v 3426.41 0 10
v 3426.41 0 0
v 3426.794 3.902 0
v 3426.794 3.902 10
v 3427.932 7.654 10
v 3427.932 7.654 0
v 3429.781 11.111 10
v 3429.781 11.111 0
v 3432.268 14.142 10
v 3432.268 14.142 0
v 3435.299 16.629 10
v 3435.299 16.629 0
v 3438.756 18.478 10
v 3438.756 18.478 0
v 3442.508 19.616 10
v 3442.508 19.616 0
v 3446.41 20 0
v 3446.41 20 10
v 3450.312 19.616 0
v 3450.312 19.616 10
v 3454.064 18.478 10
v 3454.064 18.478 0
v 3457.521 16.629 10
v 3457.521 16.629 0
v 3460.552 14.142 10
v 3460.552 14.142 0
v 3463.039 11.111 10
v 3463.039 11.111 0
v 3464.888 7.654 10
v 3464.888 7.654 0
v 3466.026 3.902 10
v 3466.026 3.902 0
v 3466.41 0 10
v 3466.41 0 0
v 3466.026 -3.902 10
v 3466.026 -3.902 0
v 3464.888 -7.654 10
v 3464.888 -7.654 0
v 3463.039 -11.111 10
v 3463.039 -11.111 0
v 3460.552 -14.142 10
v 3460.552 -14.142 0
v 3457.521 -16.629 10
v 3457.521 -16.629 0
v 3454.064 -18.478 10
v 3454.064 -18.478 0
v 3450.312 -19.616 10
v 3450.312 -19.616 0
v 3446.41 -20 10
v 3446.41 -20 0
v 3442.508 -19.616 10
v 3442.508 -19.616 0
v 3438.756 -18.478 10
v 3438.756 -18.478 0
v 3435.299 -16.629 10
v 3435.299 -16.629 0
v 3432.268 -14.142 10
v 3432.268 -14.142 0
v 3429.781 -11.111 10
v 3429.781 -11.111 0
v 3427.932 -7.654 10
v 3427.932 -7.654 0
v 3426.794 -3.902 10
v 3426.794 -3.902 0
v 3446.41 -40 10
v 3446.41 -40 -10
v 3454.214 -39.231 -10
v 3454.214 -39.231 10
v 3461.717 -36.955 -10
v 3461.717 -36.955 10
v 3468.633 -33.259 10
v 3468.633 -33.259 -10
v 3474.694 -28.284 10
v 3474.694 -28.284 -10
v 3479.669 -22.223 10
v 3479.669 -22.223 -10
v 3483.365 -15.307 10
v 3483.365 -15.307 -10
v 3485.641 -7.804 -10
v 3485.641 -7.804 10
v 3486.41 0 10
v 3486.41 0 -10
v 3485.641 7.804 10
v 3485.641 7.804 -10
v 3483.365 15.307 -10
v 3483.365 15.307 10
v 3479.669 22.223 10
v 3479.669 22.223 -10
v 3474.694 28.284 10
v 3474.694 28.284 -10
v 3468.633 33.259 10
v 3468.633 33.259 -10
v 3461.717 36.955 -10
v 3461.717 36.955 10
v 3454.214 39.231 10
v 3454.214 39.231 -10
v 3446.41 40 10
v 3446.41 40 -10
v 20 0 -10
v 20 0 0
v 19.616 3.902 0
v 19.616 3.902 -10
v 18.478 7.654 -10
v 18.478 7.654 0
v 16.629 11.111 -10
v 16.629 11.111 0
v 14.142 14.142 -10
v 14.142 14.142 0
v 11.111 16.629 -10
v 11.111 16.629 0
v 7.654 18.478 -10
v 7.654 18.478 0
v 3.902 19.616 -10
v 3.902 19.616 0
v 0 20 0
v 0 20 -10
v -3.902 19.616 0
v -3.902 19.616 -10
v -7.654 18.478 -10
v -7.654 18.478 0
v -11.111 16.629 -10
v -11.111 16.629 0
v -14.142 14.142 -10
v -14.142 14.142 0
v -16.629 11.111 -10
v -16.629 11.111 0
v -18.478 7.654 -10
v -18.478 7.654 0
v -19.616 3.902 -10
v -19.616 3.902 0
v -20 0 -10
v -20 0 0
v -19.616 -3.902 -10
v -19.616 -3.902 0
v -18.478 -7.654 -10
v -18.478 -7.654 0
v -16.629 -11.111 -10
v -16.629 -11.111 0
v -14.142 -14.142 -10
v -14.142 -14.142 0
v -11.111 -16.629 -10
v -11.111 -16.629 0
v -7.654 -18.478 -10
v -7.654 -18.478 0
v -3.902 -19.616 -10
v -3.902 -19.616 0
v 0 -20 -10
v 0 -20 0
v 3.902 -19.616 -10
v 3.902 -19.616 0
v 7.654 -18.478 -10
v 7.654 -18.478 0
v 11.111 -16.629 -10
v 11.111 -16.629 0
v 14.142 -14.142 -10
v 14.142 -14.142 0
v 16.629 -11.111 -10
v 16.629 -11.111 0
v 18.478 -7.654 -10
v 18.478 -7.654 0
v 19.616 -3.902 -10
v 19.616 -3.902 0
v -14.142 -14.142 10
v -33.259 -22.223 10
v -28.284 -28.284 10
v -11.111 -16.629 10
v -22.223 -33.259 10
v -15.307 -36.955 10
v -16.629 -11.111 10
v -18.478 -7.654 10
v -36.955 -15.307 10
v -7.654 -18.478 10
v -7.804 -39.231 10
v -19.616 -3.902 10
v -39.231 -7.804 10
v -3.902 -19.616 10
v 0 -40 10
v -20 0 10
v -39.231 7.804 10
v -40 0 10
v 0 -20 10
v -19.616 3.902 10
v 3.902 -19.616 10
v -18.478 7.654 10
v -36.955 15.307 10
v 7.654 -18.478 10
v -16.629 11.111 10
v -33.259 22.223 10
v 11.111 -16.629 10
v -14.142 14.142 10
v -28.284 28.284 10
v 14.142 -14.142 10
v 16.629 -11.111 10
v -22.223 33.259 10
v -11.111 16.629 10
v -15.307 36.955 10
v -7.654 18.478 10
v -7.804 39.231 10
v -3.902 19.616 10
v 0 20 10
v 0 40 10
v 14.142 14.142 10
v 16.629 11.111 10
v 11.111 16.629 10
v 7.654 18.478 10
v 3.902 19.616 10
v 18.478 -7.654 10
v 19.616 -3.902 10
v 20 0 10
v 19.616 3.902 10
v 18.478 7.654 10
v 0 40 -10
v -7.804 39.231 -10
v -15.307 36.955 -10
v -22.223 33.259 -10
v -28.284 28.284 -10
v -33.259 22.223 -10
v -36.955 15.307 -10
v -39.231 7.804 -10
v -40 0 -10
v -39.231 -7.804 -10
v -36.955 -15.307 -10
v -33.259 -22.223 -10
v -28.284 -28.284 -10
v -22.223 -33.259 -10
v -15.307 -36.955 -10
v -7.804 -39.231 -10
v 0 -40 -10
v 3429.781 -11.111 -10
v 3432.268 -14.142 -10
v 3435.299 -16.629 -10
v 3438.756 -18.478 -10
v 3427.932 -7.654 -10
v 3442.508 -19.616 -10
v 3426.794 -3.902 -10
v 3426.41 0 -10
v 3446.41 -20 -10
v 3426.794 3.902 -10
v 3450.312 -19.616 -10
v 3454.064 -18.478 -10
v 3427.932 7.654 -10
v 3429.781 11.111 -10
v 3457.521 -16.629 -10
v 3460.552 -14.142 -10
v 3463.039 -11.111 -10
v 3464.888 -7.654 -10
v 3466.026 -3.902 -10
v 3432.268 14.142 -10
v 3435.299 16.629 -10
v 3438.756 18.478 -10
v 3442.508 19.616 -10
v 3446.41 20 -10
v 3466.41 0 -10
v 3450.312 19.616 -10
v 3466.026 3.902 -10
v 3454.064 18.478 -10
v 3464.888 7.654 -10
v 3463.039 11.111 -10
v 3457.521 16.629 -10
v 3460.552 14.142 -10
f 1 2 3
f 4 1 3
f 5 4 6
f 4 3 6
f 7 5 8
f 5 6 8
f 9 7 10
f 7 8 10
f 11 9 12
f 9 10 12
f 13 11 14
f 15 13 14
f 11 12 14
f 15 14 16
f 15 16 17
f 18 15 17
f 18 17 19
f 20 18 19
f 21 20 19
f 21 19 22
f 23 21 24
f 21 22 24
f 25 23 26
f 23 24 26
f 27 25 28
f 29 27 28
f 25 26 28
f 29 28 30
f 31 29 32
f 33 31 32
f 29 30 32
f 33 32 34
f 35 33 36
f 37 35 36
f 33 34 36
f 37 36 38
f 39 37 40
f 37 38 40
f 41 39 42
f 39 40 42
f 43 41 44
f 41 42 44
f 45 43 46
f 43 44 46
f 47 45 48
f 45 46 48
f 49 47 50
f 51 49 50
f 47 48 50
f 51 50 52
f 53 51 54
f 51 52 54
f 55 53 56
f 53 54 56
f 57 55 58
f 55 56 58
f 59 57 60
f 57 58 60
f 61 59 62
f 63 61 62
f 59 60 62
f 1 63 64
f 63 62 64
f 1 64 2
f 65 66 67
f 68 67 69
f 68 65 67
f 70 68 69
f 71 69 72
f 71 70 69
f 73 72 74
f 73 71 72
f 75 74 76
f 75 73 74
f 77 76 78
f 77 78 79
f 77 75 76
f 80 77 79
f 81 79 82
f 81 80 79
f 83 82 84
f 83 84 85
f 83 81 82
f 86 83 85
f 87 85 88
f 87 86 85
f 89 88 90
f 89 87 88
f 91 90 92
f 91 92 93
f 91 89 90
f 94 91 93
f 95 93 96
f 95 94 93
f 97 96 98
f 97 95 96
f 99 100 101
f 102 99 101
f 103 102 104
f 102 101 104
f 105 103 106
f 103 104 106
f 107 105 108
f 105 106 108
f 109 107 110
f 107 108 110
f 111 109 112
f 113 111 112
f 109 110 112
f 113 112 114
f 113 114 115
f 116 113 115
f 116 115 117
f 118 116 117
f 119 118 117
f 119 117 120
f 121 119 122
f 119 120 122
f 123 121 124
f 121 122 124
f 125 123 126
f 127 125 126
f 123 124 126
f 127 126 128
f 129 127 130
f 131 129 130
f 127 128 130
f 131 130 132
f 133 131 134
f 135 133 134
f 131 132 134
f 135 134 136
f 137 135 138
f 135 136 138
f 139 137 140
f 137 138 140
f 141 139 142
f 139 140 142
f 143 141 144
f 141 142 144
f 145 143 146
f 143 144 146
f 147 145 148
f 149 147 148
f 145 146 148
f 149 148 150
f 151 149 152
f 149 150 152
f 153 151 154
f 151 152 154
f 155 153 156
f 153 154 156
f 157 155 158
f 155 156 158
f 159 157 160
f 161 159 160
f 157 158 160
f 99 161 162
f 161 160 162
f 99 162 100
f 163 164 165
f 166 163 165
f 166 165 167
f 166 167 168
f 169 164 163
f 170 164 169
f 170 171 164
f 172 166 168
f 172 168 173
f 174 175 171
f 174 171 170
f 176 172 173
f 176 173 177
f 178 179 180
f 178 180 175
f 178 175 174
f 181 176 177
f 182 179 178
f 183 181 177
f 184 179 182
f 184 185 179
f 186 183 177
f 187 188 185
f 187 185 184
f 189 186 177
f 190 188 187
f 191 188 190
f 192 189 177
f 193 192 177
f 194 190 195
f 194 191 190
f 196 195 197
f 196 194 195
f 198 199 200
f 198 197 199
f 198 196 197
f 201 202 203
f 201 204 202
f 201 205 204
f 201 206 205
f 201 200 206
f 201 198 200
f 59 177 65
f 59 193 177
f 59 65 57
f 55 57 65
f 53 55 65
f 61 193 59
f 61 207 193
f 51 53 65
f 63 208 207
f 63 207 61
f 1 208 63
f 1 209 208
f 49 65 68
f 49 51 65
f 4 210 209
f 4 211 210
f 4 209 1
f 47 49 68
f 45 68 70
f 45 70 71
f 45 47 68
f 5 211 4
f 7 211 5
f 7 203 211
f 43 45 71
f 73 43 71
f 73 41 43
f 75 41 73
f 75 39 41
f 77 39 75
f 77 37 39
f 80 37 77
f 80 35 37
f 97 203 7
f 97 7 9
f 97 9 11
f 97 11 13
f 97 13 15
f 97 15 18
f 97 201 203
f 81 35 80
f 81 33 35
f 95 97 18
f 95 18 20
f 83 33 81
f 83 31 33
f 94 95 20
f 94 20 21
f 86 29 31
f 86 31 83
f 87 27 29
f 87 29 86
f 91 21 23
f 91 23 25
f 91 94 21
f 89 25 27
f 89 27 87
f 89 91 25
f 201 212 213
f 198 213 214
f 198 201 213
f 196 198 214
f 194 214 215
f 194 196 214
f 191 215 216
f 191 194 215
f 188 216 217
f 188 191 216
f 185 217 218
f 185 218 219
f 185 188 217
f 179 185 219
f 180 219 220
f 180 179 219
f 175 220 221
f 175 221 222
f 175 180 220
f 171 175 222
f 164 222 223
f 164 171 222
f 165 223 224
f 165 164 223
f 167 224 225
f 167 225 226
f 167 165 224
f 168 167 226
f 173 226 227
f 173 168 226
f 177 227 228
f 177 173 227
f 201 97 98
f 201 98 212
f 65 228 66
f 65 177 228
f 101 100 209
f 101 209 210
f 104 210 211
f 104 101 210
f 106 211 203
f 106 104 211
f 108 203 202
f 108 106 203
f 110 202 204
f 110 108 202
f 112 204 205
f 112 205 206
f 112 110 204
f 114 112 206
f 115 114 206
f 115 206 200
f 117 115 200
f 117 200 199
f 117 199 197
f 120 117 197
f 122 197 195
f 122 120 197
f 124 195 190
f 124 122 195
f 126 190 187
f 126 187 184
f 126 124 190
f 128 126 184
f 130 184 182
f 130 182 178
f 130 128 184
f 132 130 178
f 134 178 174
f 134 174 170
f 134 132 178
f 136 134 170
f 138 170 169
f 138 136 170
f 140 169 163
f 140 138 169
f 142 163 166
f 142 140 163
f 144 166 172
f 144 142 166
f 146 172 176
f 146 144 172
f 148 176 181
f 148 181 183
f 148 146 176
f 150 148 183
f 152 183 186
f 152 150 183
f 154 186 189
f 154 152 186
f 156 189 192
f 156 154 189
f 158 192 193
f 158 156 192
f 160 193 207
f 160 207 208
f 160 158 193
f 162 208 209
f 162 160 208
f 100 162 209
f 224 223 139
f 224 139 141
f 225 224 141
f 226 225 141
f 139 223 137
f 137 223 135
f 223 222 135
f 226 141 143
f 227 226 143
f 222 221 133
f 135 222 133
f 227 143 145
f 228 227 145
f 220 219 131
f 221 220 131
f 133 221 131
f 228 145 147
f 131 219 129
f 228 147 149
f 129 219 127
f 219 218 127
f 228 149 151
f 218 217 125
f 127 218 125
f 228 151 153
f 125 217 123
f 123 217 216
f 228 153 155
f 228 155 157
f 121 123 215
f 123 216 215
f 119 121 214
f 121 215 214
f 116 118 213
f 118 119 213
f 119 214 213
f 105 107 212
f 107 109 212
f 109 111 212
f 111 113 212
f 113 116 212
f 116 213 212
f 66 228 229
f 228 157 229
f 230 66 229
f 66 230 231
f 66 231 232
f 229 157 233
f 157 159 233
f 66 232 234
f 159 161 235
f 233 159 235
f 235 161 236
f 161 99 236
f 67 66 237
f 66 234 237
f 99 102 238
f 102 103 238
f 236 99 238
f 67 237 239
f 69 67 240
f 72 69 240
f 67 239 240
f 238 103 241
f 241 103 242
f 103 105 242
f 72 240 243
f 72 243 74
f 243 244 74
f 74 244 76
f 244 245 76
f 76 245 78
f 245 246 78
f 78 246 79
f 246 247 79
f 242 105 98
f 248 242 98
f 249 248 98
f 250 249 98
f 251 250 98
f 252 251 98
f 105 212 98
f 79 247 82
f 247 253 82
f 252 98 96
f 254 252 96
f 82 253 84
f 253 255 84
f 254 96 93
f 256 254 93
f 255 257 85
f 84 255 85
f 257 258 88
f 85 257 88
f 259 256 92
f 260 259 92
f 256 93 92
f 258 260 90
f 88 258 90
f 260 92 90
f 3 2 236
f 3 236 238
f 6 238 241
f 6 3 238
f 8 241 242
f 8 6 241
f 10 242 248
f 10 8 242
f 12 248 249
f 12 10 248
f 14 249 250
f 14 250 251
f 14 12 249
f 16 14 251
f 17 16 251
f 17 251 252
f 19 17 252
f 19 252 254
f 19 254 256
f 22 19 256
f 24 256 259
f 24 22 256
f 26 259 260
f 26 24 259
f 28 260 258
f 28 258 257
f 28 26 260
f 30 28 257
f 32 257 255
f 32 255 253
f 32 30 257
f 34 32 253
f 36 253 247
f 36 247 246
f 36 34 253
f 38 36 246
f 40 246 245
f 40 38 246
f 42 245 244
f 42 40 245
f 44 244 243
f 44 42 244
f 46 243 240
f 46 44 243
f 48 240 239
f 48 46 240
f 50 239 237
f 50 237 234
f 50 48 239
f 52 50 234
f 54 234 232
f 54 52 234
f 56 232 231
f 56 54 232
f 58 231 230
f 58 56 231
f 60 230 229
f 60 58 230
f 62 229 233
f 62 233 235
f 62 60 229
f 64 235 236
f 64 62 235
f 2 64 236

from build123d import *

# Parameters (mm, degrees)
F0_R     = 20
F1_DEPTH = 10


with BuildPart() as f1:
    # F0 (on Top) → F1 (new body, symmetric)
    with BuildSketch(Plane.XY):
        with BuildLine():
            Line((1723.205, -40), (1723.205, 0))
            Line((1723.205, 0), (1723.205, 40))
            Line((1723.205, 40), (0, 40))
            ThreePointArc((0, 40), (-40, 0), (0, -40))
            Line((0, -40), (1723.205, -40))
        make_face()
        Circle(F0_R, mode=Mode.SUBTRACT)
        with BuildLine():
            Line((1723.205, 40), (1723.205, 0))
            Line((1723.205, 0), (1723.205, -40))
            Line((1723.205, -40), (3446.41, -40))
            ThreePointArc((3446.41, -40), (3486.41, 0), (3446.41, 40))
            Line((3446.41, 40), (1723.205, 40))
        make_face()
        with BuildLine():
            ThreePointArc((3466.41, 0), (3446.41, -20), (3426.41, 0))
            ThreePointArc((3426.41, 0), (3446.41, 20), (3466.41, 0))
        make_face(mode=Mode.SUBTRACT)
    extrude(amount=F1_DEPTH, both=True)


solid = f1.part
